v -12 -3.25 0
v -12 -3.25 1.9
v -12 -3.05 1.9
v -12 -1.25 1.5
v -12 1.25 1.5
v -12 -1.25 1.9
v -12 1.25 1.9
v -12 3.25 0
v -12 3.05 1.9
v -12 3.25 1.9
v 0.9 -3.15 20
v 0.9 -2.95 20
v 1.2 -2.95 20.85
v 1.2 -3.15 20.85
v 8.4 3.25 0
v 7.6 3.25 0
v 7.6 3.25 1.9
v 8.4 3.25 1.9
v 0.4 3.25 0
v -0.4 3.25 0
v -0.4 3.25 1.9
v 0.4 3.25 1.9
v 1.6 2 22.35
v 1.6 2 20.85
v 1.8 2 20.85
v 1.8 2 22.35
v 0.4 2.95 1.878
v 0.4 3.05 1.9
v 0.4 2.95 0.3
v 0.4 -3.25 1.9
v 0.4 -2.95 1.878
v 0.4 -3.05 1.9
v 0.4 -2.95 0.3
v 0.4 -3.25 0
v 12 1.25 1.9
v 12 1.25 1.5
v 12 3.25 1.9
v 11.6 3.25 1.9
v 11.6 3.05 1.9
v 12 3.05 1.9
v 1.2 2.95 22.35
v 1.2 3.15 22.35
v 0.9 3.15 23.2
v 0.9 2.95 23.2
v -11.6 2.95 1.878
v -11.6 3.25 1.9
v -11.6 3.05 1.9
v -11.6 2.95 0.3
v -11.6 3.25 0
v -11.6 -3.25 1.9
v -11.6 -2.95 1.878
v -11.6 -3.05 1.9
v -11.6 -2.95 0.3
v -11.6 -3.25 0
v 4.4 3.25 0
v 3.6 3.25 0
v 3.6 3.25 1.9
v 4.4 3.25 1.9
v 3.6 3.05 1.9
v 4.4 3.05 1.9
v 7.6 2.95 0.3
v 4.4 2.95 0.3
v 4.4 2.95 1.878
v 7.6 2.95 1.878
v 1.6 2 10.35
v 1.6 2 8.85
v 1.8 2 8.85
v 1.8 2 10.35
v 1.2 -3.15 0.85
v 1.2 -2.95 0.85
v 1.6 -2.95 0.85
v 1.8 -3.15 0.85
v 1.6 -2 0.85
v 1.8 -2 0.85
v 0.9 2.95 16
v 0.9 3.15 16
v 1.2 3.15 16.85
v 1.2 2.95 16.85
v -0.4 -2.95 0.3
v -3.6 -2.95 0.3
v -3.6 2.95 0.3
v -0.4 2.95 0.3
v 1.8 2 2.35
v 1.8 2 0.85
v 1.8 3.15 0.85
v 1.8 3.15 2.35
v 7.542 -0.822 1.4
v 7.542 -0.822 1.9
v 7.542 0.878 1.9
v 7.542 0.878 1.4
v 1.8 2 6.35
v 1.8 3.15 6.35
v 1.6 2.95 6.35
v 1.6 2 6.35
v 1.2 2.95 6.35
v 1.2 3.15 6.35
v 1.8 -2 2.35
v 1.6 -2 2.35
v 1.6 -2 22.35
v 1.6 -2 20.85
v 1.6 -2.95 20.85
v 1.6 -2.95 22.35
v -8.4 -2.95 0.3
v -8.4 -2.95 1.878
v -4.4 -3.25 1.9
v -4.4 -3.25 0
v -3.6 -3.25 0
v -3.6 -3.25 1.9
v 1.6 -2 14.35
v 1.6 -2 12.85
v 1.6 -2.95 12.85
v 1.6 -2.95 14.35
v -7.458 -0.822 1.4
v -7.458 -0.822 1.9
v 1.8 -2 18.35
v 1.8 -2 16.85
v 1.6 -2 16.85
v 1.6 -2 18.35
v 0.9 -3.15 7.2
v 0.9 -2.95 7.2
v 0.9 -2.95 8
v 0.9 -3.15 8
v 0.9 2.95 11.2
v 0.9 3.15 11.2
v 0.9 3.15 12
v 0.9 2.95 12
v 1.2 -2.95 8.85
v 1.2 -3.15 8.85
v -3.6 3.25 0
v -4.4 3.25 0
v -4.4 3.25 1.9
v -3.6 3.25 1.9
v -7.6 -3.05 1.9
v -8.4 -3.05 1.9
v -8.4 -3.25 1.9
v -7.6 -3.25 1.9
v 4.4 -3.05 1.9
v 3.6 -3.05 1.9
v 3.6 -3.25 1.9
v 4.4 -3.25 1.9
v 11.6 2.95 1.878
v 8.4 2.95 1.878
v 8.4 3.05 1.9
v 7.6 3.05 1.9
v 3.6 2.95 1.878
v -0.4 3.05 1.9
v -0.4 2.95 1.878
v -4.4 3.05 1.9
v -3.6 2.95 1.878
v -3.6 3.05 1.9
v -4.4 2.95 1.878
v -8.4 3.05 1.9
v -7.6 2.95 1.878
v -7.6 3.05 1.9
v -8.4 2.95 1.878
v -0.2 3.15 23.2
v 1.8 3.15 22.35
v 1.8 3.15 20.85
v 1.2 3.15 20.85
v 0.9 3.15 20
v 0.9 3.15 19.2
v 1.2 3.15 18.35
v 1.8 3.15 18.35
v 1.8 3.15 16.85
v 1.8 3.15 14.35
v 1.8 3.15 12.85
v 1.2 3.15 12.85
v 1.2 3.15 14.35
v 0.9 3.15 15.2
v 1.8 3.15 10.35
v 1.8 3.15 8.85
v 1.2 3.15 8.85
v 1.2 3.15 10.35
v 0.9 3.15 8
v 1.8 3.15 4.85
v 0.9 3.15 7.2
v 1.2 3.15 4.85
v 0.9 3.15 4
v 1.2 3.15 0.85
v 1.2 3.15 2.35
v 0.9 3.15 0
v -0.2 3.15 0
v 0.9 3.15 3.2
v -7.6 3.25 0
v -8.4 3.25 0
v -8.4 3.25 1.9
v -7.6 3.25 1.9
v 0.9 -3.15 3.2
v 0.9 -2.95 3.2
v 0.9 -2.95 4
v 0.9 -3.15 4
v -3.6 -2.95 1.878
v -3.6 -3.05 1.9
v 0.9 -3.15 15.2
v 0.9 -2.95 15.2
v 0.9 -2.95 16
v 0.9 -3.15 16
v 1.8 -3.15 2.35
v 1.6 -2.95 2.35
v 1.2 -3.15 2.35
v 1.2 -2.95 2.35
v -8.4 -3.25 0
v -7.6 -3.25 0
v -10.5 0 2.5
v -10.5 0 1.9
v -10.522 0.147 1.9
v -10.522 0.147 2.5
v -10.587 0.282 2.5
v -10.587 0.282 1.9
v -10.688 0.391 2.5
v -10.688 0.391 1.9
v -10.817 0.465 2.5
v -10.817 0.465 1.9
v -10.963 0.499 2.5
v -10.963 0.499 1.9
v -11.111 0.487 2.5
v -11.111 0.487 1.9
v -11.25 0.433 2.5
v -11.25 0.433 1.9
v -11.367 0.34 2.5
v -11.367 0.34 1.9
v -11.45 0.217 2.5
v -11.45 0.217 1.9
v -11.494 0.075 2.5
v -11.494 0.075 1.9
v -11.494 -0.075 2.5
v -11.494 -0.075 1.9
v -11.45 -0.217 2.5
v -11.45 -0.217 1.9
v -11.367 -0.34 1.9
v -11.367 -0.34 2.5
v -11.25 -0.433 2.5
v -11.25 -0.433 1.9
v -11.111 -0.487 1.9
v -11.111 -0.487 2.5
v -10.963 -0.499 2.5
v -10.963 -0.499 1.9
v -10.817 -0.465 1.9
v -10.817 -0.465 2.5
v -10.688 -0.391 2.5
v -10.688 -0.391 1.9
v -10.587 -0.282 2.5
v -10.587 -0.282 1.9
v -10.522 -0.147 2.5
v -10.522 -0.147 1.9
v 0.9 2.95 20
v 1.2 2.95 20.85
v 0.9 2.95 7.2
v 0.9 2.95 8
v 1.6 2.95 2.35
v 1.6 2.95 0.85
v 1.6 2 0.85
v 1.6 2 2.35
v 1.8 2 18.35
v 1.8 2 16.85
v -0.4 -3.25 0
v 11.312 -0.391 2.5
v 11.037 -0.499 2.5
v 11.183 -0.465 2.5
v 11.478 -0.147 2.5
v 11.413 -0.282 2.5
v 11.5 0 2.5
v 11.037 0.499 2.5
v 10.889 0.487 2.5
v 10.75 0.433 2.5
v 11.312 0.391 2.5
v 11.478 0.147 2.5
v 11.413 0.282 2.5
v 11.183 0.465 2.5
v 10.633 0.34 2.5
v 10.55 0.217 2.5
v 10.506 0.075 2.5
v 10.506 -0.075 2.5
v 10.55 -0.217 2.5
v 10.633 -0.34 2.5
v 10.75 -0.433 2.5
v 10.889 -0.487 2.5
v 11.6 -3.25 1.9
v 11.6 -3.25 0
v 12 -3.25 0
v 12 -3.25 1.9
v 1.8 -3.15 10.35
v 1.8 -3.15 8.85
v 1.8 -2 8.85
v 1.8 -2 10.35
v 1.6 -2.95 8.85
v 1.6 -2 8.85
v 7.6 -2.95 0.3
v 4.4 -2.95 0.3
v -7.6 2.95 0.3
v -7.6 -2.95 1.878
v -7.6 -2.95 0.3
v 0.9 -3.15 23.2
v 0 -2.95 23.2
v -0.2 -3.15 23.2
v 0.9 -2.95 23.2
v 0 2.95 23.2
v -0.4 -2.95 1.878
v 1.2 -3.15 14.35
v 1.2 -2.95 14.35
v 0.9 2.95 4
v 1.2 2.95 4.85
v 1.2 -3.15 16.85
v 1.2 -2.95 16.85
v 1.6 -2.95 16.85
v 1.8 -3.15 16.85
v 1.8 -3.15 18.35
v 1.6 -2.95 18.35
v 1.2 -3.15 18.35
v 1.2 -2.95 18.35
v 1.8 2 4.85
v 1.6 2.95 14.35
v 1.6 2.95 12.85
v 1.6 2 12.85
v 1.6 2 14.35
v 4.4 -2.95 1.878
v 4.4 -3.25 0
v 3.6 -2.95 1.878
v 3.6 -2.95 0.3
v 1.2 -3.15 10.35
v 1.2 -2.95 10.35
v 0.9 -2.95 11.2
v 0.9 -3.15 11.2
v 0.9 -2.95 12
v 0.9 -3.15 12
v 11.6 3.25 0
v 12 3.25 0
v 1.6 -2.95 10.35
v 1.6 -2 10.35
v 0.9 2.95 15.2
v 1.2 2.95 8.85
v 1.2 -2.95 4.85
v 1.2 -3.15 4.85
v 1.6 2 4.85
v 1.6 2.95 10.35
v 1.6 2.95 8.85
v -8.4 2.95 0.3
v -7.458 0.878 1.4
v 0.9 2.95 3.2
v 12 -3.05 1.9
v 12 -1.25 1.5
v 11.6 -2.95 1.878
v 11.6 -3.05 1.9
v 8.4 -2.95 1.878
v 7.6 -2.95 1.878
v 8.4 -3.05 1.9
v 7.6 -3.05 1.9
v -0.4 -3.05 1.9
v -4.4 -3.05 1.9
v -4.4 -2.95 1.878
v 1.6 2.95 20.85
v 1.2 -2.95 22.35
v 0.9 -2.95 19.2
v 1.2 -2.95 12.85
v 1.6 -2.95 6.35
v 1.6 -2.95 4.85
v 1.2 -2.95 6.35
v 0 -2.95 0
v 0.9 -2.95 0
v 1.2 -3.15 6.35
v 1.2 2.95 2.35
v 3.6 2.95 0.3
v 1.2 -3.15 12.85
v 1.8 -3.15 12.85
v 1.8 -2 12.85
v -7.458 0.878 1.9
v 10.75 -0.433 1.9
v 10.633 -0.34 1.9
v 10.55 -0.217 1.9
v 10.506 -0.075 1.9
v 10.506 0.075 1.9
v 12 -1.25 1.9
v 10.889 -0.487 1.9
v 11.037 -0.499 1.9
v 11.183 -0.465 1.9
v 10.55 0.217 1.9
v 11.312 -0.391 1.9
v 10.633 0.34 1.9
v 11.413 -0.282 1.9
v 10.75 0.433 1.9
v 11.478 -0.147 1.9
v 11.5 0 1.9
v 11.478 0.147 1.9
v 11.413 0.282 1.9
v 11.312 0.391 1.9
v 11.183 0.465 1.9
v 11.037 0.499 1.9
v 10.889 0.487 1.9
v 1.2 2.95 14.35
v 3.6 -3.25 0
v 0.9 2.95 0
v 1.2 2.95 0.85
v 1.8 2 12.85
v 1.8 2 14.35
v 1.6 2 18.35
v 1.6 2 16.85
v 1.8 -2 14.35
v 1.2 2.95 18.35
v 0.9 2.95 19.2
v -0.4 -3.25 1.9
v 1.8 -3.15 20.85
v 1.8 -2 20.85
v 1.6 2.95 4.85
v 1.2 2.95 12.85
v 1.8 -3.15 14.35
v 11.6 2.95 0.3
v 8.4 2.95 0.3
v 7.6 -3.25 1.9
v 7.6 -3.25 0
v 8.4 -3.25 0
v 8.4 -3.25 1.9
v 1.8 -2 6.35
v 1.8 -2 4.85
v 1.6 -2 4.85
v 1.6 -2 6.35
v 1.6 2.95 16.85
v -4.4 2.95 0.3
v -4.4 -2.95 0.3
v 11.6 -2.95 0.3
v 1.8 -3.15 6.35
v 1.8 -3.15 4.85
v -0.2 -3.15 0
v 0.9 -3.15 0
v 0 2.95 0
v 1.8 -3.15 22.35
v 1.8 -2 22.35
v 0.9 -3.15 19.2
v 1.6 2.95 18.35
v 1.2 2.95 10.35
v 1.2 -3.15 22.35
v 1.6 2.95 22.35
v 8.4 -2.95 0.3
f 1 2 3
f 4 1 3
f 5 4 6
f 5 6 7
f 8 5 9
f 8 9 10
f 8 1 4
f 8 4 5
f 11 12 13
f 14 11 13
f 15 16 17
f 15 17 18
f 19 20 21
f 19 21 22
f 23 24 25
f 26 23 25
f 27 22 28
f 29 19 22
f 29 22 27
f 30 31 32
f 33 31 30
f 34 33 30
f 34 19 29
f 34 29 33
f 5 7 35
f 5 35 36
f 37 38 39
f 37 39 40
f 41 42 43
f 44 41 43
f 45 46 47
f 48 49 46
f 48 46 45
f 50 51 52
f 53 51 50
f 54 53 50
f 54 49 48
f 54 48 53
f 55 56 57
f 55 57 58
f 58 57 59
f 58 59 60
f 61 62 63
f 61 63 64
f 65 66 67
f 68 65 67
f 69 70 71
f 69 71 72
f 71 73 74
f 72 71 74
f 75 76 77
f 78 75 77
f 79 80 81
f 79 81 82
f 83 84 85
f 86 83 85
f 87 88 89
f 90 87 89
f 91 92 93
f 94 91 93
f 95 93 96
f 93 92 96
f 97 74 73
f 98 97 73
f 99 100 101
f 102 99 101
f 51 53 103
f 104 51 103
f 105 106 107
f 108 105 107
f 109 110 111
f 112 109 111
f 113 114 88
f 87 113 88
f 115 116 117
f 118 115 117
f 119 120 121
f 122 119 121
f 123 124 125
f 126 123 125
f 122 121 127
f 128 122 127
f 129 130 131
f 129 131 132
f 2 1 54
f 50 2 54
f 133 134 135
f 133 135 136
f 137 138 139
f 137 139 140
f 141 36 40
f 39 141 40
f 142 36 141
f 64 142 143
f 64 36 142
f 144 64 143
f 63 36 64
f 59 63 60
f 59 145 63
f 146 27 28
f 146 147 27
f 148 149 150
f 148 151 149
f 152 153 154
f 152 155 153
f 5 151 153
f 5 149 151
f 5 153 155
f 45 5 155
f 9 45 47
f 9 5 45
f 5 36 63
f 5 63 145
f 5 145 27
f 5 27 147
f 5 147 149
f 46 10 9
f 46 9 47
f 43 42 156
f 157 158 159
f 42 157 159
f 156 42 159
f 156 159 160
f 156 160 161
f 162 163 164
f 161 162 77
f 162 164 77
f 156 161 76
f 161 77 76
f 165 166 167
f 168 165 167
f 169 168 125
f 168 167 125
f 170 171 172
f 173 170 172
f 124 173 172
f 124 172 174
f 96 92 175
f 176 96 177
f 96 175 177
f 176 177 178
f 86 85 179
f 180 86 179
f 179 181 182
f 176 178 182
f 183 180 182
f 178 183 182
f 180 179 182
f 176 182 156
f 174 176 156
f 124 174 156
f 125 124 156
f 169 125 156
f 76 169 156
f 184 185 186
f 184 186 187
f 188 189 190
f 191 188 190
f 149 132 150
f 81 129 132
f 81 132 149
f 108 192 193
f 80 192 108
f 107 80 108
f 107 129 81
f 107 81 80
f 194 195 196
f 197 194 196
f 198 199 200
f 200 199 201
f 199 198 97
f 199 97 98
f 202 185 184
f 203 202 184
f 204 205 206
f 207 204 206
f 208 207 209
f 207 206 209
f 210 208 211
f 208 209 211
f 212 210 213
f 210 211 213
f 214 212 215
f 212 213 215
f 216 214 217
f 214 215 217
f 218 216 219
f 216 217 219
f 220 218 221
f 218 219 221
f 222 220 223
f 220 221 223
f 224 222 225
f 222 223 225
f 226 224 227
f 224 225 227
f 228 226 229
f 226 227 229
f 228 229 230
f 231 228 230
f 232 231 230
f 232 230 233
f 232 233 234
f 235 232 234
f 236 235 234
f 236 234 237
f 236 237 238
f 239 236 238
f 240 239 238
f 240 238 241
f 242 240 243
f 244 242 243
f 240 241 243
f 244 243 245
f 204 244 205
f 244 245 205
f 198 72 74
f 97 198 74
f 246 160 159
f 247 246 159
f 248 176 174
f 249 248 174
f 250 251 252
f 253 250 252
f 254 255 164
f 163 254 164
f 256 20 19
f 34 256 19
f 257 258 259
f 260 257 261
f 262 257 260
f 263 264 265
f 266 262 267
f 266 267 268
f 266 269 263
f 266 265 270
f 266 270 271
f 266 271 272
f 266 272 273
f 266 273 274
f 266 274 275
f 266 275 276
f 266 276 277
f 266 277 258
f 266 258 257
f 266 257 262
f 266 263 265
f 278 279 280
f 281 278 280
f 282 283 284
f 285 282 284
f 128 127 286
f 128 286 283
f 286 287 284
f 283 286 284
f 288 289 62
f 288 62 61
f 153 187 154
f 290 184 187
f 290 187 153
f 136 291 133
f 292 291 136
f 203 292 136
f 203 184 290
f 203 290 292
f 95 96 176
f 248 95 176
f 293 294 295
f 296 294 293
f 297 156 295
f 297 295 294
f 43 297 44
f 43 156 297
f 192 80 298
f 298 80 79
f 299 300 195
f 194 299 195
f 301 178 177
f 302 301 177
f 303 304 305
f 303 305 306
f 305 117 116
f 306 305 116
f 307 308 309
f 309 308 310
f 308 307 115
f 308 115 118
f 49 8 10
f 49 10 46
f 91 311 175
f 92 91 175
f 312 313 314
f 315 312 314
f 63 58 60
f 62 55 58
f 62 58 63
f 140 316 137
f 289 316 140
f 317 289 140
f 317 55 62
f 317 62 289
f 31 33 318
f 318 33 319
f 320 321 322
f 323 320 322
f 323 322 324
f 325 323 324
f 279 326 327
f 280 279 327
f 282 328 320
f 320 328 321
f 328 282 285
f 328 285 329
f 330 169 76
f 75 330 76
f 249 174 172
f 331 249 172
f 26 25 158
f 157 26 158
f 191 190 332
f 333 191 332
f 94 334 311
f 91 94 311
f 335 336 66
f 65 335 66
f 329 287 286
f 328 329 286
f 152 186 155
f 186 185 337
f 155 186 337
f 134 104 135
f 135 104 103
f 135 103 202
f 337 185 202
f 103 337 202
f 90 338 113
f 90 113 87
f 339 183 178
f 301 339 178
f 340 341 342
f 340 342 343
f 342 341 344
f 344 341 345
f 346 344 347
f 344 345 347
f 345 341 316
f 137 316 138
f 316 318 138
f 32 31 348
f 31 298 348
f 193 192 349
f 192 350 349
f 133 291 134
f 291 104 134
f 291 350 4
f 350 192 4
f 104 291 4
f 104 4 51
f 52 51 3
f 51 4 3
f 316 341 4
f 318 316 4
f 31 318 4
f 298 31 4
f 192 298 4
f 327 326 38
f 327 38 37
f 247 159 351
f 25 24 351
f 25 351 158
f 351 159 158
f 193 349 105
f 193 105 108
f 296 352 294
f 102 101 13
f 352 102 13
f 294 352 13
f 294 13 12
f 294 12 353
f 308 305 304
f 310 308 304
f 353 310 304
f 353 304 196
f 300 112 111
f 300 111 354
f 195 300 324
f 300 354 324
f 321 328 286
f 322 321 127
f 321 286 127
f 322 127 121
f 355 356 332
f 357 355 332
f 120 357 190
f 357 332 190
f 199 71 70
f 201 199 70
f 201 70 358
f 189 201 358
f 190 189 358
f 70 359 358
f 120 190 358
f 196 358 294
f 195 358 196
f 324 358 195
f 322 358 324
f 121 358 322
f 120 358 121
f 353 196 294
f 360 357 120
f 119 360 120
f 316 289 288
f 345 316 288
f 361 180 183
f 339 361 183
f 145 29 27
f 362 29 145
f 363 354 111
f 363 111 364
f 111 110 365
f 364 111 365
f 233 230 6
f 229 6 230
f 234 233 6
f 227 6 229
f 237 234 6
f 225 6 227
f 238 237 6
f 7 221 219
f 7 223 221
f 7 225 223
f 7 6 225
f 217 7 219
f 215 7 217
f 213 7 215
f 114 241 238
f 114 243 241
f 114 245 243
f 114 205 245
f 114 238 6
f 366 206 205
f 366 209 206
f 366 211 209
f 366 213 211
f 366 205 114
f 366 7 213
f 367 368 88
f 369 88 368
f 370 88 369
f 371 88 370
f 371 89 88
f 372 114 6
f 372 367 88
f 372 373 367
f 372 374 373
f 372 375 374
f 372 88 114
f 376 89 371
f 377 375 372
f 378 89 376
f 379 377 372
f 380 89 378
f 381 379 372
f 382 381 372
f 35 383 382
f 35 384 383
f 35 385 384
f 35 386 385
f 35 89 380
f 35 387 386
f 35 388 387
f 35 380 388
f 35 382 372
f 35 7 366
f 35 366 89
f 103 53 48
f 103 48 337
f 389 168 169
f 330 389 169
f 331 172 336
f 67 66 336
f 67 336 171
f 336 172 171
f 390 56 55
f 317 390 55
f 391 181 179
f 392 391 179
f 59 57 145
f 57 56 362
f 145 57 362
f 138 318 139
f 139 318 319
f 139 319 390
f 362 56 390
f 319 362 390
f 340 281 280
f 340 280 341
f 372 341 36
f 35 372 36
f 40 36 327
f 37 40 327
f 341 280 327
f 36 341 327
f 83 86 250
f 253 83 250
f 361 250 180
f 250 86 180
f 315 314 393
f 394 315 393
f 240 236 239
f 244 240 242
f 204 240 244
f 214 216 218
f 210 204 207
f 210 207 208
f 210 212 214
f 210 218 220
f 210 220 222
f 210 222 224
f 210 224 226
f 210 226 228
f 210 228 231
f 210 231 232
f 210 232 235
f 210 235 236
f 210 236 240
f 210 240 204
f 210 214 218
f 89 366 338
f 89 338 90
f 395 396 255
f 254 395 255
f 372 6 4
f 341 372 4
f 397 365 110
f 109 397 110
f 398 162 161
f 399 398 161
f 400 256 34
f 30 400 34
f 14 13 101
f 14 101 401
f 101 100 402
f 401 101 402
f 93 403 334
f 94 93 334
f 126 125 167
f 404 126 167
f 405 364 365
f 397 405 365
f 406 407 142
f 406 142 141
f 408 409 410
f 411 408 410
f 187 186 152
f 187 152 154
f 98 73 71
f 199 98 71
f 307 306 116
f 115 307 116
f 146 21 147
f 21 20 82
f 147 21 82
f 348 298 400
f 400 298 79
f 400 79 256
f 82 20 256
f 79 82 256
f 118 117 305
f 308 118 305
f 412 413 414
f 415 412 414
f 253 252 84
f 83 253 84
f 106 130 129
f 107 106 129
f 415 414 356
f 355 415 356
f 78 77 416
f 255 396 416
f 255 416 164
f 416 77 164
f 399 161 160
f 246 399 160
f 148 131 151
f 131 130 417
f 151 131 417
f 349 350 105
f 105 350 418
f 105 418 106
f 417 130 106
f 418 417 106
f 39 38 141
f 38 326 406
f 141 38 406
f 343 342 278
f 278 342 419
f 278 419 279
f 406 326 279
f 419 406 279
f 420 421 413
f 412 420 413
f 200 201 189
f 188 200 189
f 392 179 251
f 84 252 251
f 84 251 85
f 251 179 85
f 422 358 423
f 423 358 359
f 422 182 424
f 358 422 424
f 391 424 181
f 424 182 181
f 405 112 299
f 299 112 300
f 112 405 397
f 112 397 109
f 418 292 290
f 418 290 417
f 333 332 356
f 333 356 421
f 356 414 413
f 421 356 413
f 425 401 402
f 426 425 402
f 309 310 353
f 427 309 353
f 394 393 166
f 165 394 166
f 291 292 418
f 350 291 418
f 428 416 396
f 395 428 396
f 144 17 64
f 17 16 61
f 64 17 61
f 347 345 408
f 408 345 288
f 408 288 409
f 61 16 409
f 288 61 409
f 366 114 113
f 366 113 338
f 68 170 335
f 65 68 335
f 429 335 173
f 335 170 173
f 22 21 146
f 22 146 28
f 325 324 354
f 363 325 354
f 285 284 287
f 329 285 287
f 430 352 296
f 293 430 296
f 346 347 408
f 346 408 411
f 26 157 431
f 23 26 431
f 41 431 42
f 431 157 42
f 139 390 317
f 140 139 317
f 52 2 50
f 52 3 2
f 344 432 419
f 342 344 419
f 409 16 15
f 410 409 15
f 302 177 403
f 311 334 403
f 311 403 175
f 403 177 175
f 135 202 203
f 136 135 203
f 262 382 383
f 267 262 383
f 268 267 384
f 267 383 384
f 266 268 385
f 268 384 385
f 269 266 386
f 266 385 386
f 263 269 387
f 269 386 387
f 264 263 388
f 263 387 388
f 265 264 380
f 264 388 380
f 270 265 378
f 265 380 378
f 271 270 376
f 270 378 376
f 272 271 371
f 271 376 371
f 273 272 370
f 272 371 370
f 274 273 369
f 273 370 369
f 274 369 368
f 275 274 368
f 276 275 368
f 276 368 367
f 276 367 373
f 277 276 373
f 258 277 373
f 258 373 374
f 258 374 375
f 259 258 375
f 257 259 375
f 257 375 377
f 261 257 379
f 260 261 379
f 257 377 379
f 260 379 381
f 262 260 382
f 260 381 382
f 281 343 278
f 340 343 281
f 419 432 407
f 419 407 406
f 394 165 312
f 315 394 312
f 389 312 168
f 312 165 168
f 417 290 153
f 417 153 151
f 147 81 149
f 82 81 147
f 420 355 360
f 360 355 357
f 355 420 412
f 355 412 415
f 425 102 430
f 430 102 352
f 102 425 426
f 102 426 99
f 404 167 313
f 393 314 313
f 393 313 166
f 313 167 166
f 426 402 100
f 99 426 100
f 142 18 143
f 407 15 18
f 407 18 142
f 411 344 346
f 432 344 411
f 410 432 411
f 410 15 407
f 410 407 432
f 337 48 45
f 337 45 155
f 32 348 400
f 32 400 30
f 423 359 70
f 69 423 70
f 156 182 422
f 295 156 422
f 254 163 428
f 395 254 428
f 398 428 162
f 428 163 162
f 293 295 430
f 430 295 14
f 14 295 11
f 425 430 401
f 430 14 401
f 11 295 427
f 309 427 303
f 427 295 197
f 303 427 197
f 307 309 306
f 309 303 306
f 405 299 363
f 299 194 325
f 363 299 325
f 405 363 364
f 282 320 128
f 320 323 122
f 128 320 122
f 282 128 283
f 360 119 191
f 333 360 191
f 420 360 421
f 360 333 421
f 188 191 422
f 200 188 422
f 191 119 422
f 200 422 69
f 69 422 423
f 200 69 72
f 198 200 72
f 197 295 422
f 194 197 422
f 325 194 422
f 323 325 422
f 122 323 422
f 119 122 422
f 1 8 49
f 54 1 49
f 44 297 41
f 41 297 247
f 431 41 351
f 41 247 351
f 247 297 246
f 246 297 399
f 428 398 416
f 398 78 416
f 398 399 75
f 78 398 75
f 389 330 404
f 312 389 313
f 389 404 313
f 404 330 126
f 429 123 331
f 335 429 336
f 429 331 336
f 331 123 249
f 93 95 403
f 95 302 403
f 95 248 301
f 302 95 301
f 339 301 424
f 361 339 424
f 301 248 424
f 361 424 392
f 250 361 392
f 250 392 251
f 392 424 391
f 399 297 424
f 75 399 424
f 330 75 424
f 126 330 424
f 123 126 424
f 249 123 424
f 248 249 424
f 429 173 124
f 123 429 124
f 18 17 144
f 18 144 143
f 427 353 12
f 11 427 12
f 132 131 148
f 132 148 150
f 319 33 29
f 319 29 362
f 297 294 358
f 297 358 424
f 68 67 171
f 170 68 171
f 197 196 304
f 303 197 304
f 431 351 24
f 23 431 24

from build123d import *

# Parameters (mm, degrees)
PAD002_DEPTH           = 23.2
POCKET004_DEPTH        = 6.301
LINEARPATTERN002_COUNT = 7
LINEARPATTERN002_PITCH = 4
SKETCH_W               = 24
SKETCH_H               = 6.5
PAD_DEPTH              = 1.9
POCKET_DEPTH           = 73.875242
SKETCH002_R            = 0.5
PAD001_DEPTH           = 0.6
SKETCH003_W            = 15
SKETCH003_H            = 1.7
POCKET001_DEPTH        = 0.5
SKETCH004_W            = 3.2
SKETCH004_H            = 8.173207
POCKET002_DEPTH        = 0.3
LINEARPATTERN_COUNT    = 6
LINEARPATTERN_PITCH    = 4
SKETCH005_W            = 3.2
SKETCH005_H            = 0.3
POCKET003_DEPTH        = 5
LINEARPATTERN001_COUNT = 6
LINEARPATTERN001_PITCH = 4


with BuildPart() as body001:
    # Sketch006 → Pad002 (new body)
    with BuildSketch(Plane.XY):
        Polygon((-0.2, 0), (-0.2, -3.15), (1.8, -3.15), (1.8, -2), (1.6, -2), (1.6, -2.95), (0, -2.95), (0, 0), (0, 2.95), (1.6, 2.95), (1.6, 2), (1.8, 2), (1.8, 3.15), (-0.2, 3.15), align=None)
    extrude(amount=PAD002_DEPTH)

    # Sketch007 (on Face13 of Pad002) → Pocket004 (cut, through all)
    with BuildSketch(Plane(origin=(0, 3.15, 0), x_dir=(-1, 0, 0), z_dir=(0, 1, 0))):
        Polygon((-2.3, 0), (-0.9, 0), (-1.2, 0.85), (-2.2, 0.85), (-2.2, 2.35), (-1.2, 2.35), (-0.9, 3.2), (-0.9, 4), (-2.3, 4), align=None)
    pocket004 = extrude(amount=-POCKET004_DEPTH, mode=Mode.SUBTRACT)

    # LinearPattern002: Pocket004 ×7
    with Locations(*[(0, 0, i * LINEARPATTERN002_PITCH) for i in range(1, LINEARPATTERN002_COUNT)]):
        add(pocket004, mode=Mode.SUBTRACT)


with BuildPart() as body:
    # Sketch → Pad (new body)
    with BuildSketch(Plane.XY):
        Rectangle(SKETCH_W, SKETCH_H)
    extrude(amount=PAD_DEPTH)

    # Sketch001 (on Face4 of Pad) → Pocket (cut, through all)
    with BuildSketch(Plane(origin=(-12, 0, 0), x_dir=(0, -1, 0), z_dir=(-1, 0, 0))):
        Polygon((-3.25, 2), (-1.25, 2), (-1.25, 1.5), (-3.05, 1.9), (-3.25, 1.9), align=None)
    pocket = extrude(amount=-POCKET_DEPTH, mode=Mode.SUBTRACT)

    # Mirrored: Pocket across Sketch001 V_Axis
    add(pocket.mirror(Plane(origin=(-12, 0, 0), x_dir=(-1, 0, 0), z_dir=(0, -1, 0))), mode=Mode.SUBTRACT)

    # Sketch002 (on Face8 of Mirrored) → Pad001 (join)
    with BuildSketch(Plane.XY.offset(1.9)):
        with Locations((-11, 0)):
            Circle(SKETCH002_R)
        with Locations((11, 0)):
            Circle(SKETCH002_R)
    extrude(amount=PAD001_DEPTH)

    # Sketch003 (on Face8 of Pad001) → Pocket001 (cut)
    with BuildSketch(Plane.XY.offset(1.9)):
        with Locations((0.042304, 0.027832)):
            Rectangle(SKETCH003_W, SKETCH003_H)
    extrude(amount=-POCKET001_DEPTH, mode=Mode.SUBTRACT)

    # Sketch004 (on Face4 of Pocket001) → Pocket002 (cut)
    with BuildSketch(Plane(origin=(0, 0, 0), x_dir=(1, 0, 0), z_dir=(0, 0, -1))):
        with Locations((-10, 0.068644)):
            Rectangle(SKETCH004_W, SKETCH004_H)
    pocket002 = extrude(amount=-POCKET002_DEPTH, mode=Mode.SUBTRACT)

    # LinearPattern: Pocket002 ×6
    with Locations(*[(i * LINEARPATTERN_PITCH, 0, 0) for i in range(1, LINEARPATTERN_COUNT)]):
        add(pocket002, mode=Mode.SUBTRACT)

    # Sketch005 (on Face6 of LinearPattern) → Pocket003 (cut)
    with BuildSketch(Plane(origin=(0, 0, 0), x_dir=(1, 0, 0), z_dir=(0, 0, -1))):
        with Locations((-10, 3.1)):
            Rectangle(SKETCH005_W, SKETCH005_H)
        with Locations((-10, -3.1)):
            Rectangle(SKETCH005_W, SKETCH005_H)
    pocket003 = extrude(amount=-POCKET003_DEPTH, mode=Mode.SUBTRACT)

    # LinearPattern001: Pocket003 ×6
    with Locations(*[(i * LINEARPATTERN001_PITCH, 0, 0) for i in range(1, LINEARPATTERN001_COUNT)]):
        add(pocket003, mode=Mode.SUBTRACT)


solid = Compound([body001.part, body.part])
